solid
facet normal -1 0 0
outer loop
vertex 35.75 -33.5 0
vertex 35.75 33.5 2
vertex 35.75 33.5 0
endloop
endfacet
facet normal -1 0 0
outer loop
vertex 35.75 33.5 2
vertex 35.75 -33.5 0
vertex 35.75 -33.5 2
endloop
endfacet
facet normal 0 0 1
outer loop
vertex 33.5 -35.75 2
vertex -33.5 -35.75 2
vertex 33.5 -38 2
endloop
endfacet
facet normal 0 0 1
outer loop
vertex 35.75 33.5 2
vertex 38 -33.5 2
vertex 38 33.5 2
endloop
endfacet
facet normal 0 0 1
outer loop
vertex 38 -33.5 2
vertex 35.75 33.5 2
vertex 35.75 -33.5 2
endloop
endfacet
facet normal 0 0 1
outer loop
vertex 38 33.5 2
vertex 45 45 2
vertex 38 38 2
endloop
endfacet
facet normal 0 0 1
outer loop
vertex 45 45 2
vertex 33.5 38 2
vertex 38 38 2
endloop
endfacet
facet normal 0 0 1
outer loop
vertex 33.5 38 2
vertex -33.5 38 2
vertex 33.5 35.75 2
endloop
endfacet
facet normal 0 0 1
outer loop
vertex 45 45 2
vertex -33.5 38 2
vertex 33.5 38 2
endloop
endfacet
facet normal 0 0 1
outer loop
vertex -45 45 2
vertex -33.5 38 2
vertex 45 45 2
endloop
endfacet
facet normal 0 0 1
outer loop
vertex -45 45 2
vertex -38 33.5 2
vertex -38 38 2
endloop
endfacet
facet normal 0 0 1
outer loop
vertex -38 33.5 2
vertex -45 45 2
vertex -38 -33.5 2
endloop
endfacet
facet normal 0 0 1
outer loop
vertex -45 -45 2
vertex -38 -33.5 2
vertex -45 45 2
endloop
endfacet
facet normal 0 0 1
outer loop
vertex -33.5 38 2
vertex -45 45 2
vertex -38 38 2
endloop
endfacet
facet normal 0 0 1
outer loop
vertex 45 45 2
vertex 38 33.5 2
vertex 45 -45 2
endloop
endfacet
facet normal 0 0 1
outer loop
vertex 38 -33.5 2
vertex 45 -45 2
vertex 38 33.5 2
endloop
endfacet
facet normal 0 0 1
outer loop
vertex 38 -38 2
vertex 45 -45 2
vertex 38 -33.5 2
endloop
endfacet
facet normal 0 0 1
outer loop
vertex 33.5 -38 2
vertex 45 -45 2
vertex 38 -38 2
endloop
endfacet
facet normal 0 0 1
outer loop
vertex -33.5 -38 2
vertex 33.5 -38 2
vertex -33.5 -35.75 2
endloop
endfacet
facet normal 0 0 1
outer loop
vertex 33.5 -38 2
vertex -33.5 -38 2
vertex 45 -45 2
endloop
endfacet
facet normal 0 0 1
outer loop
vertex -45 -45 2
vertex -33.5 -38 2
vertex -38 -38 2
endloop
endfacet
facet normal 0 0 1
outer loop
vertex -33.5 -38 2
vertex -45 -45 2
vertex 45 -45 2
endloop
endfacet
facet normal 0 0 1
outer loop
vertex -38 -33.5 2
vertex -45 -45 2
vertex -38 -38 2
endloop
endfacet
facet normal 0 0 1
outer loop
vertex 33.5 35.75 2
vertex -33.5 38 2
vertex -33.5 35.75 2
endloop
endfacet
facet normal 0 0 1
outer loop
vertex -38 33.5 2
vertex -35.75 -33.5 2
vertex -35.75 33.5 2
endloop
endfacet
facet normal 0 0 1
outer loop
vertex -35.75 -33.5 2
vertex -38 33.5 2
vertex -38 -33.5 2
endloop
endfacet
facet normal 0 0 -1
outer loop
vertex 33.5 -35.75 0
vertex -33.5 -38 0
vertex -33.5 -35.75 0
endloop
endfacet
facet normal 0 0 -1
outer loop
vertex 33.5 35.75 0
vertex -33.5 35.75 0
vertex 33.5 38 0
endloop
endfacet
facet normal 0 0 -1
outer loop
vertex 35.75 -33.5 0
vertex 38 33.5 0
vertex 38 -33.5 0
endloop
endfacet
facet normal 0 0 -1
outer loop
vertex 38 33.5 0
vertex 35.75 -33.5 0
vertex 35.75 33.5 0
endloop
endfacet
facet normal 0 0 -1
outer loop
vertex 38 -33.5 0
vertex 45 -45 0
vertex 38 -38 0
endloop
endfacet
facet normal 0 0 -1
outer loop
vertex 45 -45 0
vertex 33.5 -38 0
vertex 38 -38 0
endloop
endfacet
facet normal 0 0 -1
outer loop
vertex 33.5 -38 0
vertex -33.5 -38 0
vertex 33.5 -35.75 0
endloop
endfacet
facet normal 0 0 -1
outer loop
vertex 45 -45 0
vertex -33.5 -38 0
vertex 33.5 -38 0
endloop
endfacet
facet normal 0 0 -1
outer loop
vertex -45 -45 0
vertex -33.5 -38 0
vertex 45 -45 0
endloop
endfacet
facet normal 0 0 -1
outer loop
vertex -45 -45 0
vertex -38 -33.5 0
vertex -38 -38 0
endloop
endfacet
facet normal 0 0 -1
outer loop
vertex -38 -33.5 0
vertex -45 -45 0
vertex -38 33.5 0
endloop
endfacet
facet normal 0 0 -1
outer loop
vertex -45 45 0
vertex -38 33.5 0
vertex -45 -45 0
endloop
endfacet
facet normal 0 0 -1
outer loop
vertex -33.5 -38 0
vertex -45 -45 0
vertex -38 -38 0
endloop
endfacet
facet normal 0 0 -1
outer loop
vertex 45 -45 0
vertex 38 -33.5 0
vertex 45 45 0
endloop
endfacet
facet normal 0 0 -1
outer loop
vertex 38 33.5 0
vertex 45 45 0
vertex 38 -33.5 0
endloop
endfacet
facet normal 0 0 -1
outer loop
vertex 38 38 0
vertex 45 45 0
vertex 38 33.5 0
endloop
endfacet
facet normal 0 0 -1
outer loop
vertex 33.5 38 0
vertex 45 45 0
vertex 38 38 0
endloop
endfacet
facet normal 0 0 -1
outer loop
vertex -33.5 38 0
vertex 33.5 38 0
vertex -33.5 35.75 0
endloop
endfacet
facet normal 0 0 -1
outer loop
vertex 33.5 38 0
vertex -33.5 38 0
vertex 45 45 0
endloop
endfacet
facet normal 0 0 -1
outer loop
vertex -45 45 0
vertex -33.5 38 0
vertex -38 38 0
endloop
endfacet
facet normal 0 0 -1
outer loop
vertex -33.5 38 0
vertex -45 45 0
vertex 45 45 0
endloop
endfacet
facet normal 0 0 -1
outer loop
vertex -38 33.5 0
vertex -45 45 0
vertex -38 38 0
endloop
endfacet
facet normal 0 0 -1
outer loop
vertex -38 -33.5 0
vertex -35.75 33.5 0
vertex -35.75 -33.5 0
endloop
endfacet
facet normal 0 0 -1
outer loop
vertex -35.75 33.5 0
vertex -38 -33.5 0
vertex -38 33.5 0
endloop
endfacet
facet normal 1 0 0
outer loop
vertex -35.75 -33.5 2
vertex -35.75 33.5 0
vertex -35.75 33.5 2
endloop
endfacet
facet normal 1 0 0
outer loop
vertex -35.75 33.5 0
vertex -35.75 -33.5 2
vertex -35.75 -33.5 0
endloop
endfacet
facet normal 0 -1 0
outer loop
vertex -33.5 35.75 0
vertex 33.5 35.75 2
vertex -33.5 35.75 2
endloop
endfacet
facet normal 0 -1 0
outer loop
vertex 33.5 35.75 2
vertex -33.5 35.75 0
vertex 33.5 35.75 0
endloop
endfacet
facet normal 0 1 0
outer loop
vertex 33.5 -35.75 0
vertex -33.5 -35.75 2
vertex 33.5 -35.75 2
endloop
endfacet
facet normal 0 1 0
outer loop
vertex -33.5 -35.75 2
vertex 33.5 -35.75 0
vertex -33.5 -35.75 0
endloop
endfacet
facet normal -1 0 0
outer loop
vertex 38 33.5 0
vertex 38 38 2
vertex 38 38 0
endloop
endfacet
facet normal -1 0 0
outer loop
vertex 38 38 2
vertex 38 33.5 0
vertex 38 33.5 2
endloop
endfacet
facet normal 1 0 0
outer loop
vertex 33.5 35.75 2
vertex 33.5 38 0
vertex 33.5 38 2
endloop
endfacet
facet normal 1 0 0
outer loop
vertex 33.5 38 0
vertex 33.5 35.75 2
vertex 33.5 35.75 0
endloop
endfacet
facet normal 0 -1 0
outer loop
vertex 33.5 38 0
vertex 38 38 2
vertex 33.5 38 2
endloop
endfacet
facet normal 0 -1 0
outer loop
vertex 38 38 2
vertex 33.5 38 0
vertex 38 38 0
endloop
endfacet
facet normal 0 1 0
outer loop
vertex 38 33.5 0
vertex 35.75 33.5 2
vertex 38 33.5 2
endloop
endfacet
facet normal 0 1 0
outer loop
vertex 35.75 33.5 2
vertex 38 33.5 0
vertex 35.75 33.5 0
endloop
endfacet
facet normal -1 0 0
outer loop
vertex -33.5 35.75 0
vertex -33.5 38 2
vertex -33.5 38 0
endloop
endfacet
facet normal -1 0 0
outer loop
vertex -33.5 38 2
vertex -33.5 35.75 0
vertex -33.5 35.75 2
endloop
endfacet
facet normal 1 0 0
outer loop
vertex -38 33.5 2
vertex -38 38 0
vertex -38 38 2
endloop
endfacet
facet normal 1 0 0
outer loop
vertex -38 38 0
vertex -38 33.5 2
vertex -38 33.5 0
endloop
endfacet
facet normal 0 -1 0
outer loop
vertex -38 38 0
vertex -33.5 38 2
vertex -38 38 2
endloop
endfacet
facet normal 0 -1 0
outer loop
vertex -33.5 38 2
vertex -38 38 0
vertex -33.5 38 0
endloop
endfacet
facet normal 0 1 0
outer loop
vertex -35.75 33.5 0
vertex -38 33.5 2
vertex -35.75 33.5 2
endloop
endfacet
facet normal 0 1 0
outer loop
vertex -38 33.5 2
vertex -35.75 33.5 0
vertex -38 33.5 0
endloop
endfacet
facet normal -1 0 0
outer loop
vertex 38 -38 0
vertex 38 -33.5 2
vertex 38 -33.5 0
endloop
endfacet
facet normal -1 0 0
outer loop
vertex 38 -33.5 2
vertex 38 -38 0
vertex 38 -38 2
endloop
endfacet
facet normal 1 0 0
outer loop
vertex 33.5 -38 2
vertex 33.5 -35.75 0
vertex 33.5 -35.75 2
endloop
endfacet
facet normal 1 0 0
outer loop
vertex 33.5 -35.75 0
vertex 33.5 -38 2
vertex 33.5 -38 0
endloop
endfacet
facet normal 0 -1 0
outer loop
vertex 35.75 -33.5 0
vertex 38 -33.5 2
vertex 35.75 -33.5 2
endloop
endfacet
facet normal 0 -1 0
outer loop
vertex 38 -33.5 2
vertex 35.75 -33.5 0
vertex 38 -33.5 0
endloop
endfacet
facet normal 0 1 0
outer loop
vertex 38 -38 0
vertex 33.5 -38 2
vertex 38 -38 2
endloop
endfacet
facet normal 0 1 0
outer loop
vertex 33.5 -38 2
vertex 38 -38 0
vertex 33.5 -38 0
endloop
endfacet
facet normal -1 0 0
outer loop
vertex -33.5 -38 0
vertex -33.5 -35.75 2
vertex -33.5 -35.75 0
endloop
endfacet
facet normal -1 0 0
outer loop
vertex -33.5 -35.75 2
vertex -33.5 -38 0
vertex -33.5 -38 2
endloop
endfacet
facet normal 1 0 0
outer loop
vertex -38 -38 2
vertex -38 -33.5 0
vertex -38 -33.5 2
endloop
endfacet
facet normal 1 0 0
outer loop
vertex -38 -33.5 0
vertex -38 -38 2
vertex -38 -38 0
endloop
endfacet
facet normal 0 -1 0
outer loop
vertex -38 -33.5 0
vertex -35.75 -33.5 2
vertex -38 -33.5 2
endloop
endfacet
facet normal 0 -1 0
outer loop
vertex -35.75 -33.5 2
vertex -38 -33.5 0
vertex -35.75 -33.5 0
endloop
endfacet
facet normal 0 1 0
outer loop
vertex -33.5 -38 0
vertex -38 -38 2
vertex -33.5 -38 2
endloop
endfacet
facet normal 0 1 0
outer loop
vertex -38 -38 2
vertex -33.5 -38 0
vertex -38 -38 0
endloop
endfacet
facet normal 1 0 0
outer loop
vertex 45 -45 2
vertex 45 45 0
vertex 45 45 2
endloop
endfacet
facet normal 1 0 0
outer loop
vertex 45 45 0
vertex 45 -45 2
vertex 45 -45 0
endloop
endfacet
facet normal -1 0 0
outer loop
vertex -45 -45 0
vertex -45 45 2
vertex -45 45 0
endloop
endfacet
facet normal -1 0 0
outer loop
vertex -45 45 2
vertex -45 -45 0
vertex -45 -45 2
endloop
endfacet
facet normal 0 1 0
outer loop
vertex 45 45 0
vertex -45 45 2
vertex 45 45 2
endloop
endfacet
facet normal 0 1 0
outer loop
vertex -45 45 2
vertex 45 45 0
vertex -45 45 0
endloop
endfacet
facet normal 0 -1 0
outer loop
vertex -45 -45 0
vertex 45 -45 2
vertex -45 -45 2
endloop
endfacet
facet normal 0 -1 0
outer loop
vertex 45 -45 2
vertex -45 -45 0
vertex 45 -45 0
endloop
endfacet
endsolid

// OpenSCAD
// Built by bench/smallmodels/features/compiler.py from a list of features.
$fn = 64;
difference() {
  union() {
    translate([0, 0, 0]) translate([-45, -45, 0]) cube([90, 90, 2]);
  }
  union() {
    translate([0, 0, 0]) rotate([0, 0, 0]) translate([-35.75, -35.75, 0]) cube([71.5, 71.5, 2]);
    translate([35.75, 35.75, 0]) rotate([0, 0, 0]) translate([-2.25, -2.25, 0]) cube([4.5, 4.5, 2]);
    translate([-35.75, 35.75, 0]) rotate([0, 0, 0]) translate([-2.25, -2.25, 0]) cube([4.5, 4.5, 2]);
    translate([35.75, -35.75, 0]) rotate([0, 0, 0]) translate([-2.25, -2.25, 0]) cube([4.5, 4.5, 2]);
    translate([-35.75, -35.75, 0]) rotate([0, 0, 0]) translate([-2.25, -2.25, 0]) cube([4.5, 4.5, 2]);
  }
}
